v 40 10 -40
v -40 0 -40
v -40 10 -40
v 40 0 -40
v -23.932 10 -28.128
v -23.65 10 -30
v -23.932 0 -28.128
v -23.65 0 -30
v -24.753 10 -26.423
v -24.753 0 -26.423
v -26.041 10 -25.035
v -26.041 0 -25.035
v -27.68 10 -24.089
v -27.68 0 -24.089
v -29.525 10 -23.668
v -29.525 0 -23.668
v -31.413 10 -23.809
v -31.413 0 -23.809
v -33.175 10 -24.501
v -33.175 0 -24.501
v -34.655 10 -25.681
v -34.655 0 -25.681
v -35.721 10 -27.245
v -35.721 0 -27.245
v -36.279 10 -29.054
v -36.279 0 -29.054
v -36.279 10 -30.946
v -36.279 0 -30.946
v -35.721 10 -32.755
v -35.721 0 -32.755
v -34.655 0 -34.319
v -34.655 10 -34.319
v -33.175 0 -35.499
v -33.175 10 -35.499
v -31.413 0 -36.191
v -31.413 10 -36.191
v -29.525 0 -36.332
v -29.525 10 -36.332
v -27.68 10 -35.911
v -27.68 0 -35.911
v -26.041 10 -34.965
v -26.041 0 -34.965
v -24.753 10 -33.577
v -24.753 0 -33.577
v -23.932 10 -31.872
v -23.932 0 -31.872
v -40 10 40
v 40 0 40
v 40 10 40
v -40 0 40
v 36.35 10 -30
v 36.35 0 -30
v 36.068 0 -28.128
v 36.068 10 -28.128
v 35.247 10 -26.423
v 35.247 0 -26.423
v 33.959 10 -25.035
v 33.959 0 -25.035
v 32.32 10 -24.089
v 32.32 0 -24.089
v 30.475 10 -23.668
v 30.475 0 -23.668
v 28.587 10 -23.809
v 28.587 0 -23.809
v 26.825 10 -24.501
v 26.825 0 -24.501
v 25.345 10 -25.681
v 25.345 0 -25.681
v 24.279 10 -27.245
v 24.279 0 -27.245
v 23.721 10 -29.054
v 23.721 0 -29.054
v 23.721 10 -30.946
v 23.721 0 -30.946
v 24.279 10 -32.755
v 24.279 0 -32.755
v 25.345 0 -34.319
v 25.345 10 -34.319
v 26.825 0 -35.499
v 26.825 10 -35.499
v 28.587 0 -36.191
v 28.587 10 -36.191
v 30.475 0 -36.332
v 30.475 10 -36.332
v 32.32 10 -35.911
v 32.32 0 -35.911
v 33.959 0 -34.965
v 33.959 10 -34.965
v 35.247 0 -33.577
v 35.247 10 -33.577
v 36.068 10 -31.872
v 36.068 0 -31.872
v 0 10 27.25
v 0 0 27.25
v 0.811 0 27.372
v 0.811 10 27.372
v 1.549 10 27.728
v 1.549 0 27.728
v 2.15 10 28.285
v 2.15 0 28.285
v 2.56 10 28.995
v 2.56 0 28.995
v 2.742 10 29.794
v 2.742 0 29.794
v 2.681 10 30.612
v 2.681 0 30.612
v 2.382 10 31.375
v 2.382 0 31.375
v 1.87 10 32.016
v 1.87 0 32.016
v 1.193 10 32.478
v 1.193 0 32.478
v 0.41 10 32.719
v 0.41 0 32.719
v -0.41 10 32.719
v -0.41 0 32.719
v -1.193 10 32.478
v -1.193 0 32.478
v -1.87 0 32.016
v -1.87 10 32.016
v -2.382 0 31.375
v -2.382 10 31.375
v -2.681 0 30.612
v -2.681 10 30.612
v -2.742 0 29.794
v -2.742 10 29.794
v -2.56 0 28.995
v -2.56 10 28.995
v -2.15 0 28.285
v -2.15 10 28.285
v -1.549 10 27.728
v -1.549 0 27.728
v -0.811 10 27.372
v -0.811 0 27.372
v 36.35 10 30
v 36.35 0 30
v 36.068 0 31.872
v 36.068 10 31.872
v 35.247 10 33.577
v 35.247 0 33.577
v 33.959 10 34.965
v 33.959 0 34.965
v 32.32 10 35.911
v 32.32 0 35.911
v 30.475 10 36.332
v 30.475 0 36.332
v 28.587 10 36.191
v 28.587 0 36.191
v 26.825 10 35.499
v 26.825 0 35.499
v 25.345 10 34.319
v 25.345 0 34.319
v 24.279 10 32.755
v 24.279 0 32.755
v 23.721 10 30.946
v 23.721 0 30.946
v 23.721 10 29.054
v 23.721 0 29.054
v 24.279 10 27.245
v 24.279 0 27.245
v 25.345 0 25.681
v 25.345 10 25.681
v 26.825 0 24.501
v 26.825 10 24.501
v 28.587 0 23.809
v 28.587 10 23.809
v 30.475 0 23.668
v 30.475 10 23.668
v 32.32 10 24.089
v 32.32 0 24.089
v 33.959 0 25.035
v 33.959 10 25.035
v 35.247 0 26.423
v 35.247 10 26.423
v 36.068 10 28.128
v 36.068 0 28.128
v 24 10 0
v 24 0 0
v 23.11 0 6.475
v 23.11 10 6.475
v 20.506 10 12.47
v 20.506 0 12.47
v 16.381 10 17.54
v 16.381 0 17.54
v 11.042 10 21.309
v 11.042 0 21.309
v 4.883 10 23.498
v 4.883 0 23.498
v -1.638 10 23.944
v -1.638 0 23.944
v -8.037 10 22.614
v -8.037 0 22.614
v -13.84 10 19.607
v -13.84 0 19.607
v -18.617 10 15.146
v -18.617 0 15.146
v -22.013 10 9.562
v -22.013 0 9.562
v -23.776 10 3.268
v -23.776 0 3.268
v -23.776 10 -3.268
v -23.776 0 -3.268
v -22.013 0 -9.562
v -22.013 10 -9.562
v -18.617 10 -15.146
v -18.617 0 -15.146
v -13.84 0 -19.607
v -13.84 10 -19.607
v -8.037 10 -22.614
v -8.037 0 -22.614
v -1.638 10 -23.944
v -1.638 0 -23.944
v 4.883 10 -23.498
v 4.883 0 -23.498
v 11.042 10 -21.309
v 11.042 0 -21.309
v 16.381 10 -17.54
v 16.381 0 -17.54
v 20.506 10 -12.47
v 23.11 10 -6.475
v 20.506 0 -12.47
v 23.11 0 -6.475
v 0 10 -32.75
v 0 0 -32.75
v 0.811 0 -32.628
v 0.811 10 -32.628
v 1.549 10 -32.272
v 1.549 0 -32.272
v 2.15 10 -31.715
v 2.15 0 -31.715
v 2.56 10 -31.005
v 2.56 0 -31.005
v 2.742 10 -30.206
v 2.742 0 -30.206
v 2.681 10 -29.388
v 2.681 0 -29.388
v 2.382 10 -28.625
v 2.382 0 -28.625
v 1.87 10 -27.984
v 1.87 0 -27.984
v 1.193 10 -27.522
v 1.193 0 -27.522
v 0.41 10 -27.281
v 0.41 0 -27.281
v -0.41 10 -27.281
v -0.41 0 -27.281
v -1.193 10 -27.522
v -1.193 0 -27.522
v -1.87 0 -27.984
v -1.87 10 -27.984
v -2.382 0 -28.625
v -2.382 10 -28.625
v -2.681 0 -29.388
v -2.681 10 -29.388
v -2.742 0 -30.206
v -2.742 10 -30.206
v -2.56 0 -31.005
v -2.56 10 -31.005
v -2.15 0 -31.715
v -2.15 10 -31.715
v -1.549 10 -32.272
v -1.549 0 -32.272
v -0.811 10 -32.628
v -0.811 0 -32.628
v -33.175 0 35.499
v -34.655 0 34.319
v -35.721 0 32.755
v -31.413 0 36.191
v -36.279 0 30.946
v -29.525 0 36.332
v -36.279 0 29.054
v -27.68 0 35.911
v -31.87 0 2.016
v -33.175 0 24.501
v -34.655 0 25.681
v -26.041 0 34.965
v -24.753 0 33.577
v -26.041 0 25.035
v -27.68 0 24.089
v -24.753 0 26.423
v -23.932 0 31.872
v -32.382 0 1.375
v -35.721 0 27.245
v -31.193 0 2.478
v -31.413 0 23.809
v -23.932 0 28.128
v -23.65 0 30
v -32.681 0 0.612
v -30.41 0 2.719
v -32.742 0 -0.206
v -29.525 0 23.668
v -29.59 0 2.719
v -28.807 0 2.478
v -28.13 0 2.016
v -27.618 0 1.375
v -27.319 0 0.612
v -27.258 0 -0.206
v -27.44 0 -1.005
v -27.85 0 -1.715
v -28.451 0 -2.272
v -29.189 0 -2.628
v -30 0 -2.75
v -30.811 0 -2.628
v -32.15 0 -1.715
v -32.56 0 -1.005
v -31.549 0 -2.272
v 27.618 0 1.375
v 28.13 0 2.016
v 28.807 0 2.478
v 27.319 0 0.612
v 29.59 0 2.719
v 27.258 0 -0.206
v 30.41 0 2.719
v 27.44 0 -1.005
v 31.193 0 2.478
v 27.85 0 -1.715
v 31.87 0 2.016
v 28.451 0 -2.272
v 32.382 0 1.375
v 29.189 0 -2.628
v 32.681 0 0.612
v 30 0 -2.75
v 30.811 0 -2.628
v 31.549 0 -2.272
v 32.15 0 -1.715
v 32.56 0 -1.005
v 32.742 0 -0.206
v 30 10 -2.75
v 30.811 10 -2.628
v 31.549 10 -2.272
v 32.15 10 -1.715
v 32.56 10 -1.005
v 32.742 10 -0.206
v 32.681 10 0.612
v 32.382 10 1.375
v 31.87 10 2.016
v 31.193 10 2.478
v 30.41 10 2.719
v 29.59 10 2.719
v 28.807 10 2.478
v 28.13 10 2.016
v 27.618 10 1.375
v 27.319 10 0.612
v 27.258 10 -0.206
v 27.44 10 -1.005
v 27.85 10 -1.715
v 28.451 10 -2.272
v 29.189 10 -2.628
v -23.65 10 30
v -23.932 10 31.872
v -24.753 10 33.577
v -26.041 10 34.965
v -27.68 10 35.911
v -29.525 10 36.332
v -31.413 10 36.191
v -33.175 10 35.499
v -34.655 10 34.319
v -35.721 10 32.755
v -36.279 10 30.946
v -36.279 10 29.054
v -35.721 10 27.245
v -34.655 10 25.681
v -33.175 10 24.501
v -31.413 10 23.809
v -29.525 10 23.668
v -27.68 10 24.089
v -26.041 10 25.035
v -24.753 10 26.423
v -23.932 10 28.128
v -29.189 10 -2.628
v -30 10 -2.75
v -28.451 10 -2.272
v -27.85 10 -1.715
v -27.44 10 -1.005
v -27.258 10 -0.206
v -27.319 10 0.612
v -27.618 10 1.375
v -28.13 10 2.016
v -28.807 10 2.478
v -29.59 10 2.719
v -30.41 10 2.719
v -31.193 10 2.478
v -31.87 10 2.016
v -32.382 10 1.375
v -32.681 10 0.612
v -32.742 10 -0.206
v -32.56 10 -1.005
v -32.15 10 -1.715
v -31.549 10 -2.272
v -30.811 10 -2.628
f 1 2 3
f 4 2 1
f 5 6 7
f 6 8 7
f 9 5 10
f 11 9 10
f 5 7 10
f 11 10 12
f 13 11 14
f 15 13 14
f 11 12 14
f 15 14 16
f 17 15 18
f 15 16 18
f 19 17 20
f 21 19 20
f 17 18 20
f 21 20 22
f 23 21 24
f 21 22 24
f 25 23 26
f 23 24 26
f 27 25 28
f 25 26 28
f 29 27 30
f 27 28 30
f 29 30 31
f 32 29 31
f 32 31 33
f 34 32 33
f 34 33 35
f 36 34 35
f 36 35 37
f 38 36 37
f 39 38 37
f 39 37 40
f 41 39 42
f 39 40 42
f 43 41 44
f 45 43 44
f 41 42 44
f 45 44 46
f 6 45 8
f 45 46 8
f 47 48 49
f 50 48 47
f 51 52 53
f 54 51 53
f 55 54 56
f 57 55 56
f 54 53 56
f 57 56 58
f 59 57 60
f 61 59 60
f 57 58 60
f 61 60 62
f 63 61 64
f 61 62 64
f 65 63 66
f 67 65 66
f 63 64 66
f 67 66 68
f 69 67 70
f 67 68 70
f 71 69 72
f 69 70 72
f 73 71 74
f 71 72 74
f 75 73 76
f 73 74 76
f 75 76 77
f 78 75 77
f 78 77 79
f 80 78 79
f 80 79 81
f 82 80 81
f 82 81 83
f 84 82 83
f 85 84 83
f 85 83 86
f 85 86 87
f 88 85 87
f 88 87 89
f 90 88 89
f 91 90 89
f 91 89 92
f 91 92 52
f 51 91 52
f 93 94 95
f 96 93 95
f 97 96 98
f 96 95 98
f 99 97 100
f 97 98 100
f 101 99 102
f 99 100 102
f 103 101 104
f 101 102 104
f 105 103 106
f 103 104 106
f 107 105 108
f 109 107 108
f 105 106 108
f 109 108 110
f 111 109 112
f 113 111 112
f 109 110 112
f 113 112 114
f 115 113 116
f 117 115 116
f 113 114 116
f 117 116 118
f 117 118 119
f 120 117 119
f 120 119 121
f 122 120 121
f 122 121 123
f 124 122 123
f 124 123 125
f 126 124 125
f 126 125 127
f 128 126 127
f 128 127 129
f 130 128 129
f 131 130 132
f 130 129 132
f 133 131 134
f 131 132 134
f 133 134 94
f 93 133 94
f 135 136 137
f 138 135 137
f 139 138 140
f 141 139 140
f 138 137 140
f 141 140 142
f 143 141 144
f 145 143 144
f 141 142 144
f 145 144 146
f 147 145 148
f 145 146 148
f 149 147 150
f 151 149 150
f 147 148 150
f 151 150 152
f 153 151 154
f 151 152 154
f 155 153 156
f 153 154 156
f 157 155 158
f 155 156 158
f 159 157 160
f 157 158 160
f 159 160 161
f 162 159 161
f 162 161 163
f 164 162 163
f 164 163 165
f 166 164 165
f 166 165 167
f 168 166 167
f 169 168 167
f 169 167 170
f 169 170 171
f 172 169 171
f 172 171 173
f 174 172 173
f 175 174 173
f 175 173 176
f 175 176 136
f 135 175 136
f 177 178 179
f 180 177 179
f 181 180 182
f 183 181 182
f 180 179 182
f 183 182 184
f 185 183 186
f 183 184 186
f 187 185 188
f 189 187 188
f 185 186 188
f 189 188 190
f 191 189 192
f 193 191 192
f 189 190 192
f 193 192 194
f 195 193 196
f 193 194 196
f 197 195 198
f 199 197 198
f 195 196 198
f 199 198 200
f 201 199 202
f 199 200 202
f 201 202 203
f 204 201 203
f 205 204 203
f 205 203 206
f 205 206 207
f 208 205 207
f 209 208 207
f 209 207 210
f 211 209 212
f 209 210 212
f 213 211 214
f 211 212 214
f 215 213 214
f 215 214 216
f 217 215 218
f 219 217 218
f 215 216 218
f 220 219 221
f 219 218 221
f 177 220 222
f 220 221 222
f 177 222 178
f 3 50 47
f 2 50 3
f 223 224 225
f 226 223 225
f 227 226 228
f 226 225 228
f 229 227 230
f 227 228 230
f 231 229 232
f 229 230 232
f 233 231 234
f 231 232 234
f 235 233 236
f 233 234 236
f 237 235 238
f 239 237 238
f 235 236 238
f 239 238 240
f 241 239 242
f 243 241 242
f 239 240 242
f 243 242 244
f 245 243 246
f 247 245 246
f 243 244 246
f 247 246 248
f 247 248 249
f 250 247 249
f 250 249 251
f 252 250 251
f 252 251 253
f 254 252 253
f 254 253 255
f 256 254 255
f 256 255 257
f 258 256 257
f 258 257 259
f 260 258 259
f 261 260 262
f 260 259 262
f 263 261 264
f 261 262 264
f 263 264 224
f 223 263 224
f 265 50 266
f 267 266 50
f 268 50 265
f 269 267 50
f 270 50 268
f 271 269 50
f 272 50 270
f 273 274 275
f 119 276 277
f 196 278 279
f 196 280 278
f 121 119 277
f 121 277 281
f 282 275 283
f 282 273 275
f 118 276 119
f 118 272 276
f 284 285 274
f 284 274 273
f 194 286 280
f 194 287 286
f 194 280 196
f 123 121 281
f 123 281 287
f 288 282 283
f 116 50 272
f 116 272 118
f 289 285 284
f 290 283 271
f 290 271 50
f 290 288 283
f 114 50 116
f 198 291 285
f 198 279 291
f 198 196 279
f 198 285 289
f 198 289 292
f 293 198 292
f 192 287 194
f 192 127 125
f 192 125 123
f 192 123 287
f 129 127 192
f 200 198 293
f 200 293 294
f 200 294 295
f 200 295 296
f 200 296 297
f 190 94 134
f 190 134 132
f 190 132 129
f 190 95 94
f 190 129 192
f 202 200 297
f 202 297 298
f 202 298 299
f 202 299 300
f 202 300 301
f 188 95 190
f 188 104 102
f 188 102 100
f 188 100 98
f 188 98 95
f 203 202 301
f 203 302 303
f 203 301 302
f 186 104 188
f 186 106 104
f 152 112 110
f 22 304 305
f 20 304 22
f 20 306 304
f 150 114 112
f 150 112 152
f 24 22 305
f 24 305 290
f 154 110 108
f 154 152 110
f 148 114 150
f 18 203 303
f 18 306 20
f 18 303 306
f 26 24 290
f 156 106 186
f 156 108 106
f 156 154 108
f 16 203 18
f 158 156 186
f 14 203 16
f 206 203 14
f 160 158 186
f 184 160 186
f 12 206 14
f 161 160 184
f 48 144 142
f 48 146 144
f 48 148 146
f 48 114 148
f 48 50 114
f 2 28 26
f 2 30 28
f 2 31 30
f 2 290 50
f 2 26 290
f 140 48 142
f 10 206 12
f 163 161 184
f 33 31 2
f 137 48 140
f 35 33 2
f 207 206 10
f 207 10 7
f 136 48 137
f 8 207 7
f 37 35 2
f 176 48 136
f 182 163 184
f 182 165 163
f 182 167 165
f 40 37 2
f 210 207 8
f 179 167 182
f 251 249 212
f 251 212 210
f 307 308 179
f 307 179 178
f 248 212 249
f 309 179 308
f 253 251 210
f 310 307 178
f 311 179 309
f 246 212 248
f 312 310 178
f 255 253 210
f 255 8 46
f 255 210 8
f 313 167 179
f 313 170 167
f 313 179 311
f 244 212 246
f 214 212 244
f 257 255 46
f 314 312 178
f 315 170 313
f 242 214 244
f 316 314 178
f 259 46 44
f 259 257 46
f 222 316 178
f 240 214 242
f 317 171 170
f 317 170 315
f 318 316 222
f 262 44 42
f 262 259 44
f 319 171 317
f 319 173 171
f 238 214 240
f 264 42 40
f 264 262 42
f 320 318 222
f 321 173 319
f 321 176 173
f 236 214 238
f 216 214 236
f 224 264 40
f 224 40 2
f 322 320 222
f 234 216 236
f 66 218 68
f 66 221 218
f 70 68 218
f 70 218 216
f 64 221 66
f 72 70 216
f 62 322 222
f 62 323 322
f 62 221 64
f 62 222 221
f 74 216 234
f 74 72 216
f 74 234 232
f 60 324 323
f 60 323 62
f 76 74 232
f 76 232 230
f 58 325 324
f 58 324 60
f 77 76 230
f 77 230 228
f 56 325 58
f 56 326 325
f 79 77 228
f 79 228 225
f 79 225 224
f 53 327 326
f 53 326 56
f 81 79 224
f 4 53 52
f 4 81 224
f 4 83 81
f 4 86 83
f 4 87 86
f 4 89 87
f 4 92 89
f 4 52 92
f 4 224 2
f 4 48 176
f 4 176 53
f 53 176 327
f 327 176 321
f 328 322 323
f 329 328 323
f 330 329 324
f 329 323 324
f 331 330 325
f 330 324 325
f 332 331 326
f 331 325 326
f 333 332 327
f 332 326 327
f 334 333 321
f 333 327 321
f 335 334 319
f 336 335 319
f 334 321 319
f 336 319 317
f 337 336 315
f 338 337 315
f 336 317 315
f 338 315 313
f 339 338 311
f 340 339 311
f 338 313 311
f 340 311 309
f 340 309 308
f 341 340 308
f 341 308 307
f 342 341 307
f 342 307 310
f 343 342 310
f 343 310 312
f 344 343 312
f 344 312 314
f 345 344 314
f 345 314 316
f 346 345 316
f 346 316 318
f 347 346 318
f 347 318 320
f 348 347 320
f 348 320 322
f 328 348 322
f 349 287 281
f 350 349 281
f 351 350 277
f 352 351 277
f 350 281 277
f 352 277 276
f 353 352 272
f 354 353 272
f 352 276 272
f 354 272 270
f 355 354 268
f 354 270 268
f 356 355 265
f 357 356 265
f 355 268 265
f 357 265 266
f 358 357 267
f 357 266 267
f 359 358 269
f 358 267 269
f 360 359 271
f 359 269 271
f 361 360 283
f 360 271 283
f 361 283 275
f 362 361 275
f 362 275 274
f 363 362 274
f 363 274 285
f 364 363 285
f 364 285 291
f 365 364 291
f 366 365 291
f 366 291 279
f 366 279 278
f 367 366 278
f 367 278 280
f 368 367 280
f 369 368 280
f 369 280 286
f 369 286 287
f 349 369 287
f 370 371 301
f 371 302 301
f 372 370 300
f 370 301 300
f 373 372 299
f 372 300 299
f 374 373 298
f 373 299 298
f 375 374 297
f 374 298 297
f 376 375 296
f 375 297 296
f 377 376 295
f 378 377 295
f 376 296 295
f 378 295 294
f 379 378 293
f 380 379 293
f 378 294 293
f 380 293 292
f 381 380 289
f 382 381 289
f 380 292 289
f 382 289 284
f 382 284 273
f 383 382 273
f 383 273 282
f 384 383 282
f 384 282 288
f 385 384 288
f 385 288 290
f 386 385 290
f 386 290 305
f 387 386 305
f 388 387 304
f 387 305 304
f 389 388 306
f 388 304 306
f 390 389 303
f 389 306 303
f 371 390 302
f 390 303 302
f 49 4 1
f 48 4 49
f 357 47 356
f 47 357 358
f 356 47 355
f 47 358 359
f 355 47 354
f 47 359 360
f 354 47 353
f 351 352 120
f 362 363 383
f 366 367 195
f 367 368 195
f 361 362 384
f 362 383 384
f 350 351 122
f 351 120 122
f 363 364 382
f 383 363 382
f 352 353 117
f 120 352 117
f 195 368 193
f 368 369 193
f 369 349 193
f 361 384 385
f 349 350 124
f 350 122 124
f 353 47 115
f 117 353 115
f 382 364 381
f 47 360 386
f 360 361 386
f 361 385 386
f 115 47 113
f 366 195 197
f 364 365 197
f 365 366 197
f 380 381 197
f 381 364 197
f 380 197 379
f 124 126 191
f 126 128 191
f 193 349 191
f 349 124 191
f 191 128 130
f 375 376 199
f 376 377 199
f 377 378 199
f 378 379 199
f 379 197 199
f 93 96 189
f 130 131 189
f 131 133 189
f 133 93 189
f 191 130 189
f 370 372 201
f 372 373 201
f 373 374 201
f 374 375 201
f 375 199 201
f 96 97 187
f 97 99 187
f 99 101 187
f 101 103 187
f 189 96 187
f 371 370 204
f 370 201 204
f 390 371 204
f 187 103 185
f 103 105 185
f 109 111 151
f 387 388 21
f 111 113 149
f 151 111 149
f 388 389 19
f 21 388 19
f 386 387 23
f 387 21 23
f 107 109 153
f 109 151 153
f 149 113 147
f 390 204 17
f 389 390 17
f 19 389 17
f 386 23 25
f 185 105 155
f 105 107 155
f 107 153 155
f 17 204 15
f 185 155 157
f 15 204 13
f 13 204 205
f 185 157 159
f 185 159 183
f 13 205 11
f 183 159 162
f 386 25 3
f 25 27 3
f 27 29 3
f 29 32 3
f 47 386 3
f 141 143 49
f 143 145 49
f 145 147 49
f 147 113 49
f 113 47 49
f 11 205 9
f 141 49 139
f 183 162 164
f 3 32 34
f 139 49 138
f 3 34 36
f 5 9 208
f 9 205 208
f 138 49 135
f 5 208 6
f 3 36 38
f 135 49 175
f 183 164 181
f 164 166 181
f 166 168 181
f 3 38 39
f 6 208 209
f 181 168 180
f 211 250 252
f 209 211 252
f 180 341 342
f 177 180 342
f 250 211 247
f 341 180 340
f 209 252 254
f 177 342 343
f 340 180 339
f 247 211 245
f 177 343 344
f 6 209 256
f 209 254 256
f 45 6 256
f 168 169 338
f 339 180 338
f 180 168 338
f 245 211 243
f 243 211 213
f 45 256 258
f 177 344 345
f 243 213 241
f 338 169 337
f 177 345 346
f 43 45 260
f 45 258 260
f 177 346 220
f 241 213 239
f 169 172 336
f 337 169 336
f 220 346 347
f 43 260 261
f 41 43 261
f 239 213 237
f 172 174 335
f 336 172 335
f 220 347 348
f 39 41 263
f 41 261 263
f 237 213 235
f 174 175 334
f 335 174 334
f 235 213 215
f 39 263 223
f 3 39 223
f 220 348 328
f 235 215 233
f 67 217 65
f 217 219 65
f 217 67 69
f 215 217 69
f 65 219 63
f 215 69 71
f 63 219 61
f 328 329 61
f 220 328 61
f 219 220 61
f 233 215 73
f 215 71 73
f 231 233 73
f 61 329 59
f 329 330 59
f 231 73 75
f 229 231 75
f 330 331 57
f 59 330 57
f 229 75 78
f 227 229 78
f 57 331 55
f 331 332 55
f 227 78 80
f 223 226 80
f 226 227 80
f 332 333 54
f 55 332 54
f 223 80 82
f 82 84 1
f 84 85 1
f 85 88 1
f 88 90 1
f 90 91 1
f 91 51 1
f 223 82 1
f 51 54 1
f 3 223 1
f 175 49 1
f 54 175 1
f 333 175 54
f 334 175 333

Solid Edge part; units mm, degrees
sketch "Sketch1" plane through (0, 0, 0) normal (0, -1, 0) x (1, 0, 0)
  line L0 (40, 40) -> (-40, 40)
  line L1 (-40, 40) -> (-40, -40)
  line L2 (-40, -40) -> (40, -40)
  line L3 (40, -40) -> (40, 40)
  circle A0 centre (0, 0) radius 24
extrude "Extrusionsausprägung_23" add sketch "Sketch1" against normal blind 10
hole "Bohrung_5" at (0, 0, 30) direction (0, 1, 0) diameter 5.5 end up to next
hole "Hole1" at (30, 0, 0) direction (0, 1, 0) diameter 5.5 end up to next
hole "Hole2" at (0, 0, -30) direction (0, 1, 0) diameter 5.5 end up to next
hole "Hole3" at (-30, 0, 0) direction (0, 1, 0) diameter 5.5 end up to next
sketch "Sketch2" plane through (0, 0, 0) normal (0, -1, 0) x (1, 0, 0)
  circle A0 centre (-30, 30) radius 6.35
  circle A1 centre (30, 30) radius 6.35
  circle A2 centre (30, -30) radius 6.35
  circle A3 centre (-30, -30) radius 6.35
extrude "Extrusionsausschnitt_26" cut sketch "Sketch2" against normal blind 274
